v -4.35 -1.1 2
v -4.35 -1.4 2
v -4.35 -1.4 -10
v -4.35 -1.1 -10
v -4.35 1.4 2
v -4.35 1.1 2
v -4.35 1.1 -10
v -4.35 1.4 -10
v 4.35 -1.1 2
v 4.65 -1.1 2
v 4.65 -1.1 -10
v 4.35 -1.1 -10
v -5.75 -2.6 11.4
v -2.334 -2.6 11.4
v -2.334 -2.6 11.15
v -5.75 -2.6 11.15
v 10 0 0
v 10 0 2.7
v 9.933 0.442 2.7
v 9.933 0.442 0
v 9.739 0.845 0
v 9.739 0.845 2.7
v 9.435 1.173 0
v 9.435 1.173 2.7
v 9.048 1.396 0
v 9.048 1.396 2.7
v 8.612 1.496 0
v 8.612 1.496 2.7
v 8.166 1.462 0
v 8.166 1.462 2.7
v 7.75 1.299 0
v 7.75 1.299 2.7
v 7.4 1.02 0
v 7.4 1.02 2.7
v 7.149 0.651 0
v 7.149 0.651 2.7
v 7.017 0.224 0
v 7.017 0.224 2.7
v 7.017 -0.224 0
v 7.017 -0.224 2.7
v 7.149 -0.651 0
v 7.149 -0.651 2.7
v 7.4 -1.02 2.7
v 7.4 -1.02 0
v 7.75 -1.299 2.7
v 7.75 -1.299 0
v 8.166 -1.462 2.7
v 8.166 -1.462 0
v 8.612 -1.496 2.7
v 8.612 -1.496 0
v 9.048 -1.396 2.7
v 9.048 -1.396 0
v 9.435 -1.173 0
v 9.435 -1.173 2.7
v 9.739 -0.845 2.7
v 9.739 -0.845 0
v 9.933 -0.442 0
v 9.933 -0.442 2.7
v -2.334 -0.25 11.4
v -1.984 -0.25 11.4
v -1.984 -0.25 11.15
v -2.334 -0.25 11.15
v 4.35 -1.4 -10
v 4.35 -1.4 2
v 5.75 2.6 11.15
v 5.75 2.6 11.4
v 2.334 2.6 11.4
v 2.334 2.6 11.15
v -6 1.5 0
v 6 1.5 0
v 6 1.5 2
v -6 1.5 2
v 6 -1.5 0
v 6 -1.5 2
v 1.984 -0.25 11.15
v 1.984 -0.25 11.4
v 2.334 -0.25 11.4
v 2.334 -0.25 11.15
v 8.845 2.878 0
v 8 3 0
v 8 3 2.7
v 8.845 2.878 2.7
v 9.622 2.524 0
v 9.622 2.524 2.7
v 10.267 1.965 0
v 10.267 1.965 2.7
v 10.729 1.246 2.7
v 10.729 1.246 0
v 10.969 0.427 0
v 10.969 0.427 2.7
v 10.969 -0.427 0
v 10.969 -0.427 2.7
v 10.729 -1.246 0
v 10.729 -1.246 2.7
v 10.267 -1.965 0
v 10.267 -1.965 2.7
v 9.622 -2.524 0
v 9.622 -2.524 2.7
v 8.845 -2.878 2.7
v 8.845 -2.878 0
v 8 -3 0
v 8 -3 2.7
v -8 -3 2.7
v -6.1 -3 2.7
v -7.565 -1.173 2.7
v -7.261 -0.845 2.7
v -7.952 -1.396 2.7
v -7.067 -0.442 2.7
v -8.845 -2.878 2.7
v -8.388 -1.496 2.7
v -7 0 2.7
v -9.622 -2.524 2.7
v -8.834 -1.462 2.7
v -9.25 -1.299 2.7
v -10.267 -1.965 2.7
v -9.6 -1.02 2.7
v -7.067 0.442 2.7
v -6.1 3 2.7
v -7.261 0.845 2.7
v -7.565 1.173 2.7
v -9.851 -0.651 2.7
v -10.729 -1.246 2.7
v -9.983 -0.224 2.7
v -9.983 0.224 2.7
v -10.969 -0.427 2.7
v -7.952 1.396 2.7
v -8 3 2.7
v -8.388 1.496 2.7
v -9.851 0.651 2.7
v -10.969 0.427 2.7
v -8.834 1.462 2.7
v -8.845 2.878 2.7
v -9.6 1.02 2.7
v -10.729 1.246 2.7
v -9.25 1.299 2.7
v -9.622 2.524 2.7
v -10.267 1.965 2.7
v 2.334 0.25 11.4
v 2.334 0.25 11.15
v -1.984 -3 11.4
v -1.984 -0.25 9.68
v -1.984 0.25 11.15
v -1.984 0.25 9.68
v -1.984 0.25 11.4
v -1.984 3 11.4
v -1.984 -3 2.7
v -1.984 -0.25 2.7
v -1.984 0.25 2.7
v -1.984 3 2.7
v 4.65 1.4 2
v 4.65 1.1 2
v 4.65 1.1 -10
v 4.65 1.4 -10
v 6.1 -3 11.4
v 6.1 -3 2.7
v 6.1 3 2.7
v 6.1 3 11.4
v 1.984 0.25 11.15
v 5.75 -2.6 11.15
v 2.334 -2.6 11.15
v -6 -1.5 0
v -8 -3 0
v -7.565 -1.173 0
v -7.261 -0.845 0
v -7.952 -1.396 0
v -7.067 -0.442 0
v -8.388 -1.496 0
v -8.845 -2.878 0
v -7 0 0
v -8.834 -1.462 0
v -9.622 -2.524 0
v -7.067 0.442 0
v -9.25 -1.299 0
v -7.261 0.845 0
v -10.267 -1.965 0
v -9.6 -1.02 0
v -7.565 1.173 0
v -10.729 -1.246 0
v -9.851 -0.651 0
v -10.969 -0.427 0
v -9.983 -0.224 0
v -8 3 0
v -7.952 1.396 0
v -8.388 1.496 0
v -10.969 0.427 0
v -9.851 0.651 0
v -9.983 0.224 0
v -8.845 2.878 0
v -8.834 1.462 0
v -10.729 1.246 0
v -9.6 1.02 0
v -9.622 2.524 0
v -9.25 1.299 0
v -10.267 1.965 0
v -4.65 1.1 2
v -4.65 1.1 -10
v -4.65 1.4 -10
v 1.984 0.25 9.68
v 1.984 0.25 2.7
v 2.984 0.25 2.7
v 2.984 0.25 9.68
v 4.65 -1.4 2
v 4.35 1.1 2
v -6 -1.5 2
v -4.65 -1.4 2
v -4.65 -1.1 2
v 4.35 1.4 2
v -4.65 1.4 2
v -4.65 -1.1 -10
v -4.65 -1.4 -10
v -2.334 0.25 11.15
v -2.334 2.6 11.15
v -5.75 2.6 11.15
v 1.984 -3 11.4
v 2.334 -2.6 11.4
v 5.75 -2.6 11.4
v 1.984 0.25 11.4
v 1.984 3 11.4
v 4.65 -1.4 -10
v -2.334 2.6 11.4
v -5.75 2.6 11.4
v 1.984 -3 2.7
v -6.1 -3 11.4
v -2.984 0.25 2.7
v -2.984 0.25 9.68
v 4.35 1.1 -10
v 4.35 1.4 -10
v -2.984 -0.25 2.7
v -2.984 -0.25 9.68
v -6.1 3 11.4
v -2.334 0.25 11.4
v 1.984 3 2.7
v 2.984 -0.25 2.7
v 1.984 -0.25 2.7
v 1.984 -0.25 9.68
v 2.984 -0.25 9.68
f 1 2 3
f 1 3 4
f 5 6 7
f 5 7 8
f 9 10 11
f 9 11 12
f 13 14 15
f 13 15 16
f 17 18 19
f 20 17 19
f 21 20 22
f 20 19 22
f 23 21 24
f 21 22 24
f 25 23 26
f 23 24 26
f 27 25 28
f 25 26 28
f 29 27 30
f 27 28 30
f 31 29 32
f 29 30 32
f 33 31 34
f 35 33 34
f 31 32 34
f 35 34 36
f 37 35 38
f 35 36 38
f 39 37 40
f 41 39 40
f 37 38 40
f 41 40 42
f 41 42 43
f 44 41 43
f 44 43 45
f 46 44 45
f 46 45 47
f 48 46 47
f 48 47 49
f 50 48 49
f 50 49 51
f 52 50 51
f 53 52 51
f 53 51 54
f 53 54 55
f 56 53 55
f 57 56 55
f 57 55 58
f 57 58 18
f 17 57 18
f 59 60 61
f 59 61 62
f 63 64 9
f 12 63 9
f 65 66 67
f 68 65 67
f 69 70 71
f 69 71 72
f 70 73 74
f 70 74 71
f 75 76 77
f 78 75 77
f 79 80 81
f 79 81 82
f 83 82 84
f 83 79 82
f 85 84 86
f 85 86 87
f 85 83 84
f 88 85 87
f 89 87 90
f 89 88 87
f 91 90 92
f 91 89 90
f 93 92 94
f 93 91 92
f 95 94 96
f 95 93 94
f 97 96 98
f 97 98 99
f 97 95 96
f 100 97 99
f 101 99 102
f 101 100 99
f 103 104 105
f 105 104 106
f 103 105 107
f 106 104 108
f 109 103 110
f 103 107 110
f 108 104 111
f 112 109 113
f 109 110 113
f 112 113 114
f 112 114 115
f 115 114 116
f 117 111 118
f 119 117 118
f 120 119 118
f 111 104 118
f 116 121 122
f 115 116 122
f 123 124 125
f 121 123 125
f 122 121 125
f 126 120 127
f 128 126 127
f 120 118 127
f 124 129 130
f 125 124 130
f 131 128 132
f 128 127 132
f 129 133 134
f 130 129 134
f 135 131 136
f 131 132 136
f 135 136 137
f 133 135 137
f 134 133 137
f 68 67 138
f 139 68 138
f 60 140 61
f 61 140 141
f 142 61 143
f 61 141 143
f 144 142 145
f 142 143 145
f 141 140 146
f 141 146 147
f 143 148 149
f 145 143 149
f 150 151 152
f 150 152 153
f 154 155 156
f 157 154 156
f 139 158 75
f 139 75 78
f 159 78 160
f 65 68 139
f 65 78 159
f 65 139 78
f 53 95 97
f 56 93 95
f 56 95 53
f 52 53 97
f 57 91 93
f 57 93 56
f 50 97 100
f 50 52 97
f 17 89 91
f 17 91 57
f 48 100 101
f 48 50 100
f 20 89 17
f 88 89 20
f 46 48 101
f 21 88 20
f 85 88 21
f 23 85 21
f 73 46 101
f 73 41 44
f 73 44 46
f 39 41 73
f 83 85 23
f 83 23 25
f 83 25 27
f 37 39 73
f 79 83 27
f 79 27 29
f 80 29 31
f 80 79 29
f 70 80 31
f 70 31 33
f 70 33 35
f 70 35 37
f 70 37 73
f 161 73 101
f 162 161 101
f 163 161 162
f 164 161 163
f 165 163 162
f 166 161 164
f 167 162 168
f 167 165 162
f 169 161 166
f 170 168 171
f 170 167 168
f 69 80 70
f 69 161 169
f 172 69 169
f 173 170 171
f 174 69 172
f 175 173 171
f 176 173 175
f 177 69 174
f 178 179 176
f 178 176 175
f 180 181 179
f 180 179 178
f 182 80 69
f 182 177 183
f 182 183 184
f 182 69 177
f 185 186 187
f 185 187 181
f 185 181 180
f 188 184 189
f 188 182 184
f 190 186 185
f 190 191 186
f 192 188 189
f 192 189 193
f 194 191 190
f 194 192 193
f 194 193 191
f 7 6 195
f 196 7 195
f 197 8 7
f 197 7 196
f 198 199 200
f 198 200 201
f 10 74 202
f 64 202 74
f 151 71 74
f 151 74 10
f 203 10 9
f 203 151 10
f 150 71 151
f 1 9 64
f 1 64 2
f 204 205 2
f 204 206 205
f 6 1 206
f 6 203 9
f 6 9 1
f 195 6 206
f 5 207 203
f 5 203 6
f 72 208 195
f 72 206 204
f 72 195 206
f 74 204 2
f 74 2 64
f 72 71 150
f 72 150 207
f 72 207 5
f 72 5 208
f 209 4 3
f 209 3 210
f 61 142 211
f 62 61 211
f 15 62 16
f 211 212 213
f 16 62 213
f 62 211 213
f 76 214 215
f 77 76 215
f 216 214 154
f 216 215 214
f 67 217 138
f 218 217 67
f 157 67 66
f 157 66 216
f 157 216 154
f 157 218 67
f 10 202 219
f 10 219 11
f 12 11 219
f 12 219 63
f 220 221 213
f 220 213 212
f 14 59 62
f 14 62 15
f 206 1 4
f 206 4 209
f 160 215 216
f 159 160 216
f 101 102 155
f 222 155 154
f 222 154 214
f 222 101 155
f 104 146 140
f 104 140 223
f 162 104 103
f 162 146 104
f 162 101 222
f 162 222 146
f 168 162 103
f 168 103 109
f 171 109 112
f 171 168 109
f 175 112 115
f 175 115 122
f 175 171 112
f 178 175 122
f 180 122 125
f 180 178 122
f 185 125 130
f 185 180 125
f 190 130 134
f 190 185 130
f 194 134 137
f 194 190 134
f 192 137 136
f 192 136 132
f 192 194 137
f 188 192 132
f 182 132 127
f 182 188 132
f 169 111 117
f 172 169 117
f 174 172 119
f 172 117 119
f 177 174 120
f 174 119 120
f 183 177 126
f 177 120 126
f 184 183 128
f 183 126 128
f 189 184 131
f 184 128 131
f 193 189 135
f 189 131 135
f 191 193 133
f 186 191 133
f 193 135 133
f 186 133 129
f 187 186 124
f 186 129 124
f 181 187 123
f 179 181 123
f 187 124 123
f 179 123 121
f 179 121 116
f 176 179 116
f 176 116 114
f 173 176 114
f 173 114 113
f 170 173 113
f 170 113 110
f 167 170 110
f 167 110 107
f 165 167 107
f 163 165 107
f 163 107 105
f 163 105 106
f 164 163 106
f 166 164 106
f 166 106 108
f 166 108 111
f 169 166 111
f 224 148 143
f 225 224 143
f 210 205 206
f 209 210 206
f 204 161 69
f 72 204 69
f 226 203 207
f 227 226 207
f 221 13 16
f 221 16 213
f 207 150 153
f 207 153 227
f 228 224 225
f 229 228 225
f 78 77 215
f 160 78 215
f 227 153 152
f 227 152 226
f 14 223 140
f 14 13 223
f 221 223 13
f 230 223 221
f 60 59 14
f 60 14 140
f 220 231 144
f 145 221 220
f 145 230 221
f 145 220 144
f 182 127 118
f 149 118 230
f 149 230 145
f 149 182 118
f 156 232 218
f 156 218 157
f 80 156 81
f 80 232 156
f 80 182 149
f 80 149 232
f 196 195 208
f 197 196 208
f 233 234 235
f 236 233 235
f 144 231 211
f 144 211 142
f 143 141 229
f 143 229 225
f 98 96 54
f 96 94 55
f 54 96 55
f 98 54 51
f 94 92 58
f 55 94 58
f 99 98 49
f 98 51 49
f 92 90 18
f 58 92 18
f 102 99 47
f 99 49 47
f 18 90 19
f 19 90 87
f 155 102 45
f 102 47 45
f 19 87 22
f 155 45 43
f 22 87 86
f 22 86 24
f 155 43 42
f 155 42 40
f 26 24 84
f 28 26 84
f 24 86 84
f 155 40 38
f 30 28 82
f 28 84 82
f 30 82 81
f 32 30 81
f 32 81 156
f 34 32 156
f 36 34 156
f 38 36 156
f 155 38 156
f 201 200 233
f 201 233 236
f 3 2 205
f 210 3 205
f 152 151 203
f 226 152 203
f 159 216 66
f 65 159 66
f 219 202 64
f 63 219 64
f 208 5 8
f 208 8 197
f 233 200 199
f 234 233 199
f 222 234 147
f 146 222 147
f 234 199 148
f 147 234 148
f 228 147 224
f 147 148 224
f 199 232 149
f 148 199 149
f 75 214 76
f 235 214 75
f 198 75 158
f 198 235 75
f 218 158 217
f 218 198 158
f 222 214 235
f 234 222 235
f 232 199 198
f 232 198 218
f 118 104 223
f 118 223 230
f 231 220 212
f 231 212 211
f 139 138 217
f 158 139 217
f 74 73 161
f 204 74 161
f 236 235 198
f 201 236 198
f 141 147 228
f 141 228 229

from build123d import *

# Parameters (mm, degrees)
BOSS_EXTRUDE1_DEPTH  = 2.7
SKETCH2_R            = 1.5
CUT_EXTRUDE1_DEPTH   = 3.7
SKETCH3_W            = 4.115625
SKETCH3_H            = 6
BOSS_EXTRUDE2_DEPTH  = 8.7
SKETCH4_W            = 12
SKETCH4_H            = 3
CUT_EXTRUDE2_DEPTH   = 2
CUT_EXTRUDE3_DEPTH   = 0.25
SKETCH6_W            = 0.3
SKETCH6_H            = 0.3
BOSS_EXTRUDE3_DEPTH  = 12
LPATTERN1_COUNT      = 2
LPATTERN1_PITCH      = 2.5
LPATTERN1_COUNT_DIR2 = 2
LPATTERN1_PITCH_DIR2 = 9
SKETCH7_W            = 6.98
SKETCH7_H            = 0.5
CUT_EXTRUDE4_DEPTH   = 1


with BuildPart() as part:
    # Sketch1 → Boss-Extrude1 (new body)
    with BuildSketch(Plane.XY):
        with BuildLine():
            Line((-8, 3), (8, 3))
            ThreePointArc((8, 3), (11, 0), (8, -3))
            Line((8, -3), (-8, -3))
            ThreePointArc((-8, -3), (-11, 0), (-8, 3))
        make_face()
    extrude(amount=BOSS_EXTRUDE1_DEPTH)

    # Sketch2 → Cut-Extrude1 (cut, through all)
    with BuildSketch(Plane.XY.offset(2.7)):
        with Locations((-8.5, 0)):
            Circle(SKETCH2_R)
        with Locations((8.5, 0)):
            Circle(SKETCH2_R)
    extrude(amount=-CUT_EXTRUDE1_DEPTH, mode=Mode.SUBTRACT)

    # Sketch3 → Boss-Extrude2 (add)
    with BuildSketch(Plane.XY.offset(2.7)):
        with Locations((-4.0421875, 0)):
            Rectangle(SKETCH3_W, SKETCH3_H)
        with Locations((4.0421875, 0)):
            Rectangle(SKETCH3_W, SKETCH3_H)
    extrude(amount=BOSS_EXTRUDE2_DEPTH)

    # Sketch4 → Cut-Extrude2 (cut)
    with BuildSketch(Plane(origin=(0, 0, 0), x_dir=(-1, 0, 0), z_dir=(0, 0, -1))):
        Rectangle(SKETCH4_W, SKETCH4_H)
    extrude(amount=-CUT_EXTRUDE2_DEPTH, mode=Mode.SUBTRACT)

    # Sketch5 → Cut-Extrude3 (cut)
    with BuildSketch(Plane.XY.offset(11.4)):
        Polygon((-2.334375, 0.25), (-1.984375, 0.25), (-1.984375, -0.25), (-2.334375, -0.25), (-2.334375, -2.6), (-5.75, -2.6), (-5.75, 2.6), (-2.334375, 2.6), align=None)
    cut_extrude3 = extrude(amount=-CUT_EXTRUDE3_DEPTH, mode=Mode.SUBTRACT)

    # Mirror1: Cut-Extrude3 across plane
    add(cut_extrude3.mirror(Plane(origin=(0, 0, 0), x_dir=(0, 0, 1), z_dir=(1, 0, 0))), mode=Mode.SUBTRACT)

    # Sketch6 → Boss-Extrude3 (add)
    with BuildSketch(Plane(origin=(0, 0, 2), x_dir=(-1, 0, 0), z_dir=(0, 0, -1))):
        with Locations((-4.5, 1.25)):
            Rectangle(SKETCH6_W, SKETCH6_H)
    boss_extrude3 = extrude(amount=BOSS_EXTRUDE3_DEPTH)

    # LPattern1: Boss-Extrude3 2 × 2
    with Locations(*[(-j * LPATTERN1_PITCH_DIR2, -i * LPATTERN1_PITCH, 0) for i in range(LPATTERN1_COUNT) for j in range(LPATTERN1_COUNT_DIR2) if (i, j) != (0, 0)]):
        add(boss_extrude3)

    # Sketch7 → Cut-Extrude4 (cut)
    with BuildSketch(Plane.ZY.offset(-1.984375)):
        with Locations((6.19, 0)):
            Rectangle(SKETCH7_W, SKETCH7_H)
    cut_extrude4 = extrude(amount=-CUT_EXTRUDE4_DEPTH, mode=Mode.SUBTRACT)

    # Mirror2: Cut-Extrude4 across plane
    add(cut_extrude4.mirror(Plane(origin=(0, 0, 0), x_dir=(0, 0, 1), z_dir=(1, 0, 0))), mode=Mode.SUBTRACT)


solid = part.part
